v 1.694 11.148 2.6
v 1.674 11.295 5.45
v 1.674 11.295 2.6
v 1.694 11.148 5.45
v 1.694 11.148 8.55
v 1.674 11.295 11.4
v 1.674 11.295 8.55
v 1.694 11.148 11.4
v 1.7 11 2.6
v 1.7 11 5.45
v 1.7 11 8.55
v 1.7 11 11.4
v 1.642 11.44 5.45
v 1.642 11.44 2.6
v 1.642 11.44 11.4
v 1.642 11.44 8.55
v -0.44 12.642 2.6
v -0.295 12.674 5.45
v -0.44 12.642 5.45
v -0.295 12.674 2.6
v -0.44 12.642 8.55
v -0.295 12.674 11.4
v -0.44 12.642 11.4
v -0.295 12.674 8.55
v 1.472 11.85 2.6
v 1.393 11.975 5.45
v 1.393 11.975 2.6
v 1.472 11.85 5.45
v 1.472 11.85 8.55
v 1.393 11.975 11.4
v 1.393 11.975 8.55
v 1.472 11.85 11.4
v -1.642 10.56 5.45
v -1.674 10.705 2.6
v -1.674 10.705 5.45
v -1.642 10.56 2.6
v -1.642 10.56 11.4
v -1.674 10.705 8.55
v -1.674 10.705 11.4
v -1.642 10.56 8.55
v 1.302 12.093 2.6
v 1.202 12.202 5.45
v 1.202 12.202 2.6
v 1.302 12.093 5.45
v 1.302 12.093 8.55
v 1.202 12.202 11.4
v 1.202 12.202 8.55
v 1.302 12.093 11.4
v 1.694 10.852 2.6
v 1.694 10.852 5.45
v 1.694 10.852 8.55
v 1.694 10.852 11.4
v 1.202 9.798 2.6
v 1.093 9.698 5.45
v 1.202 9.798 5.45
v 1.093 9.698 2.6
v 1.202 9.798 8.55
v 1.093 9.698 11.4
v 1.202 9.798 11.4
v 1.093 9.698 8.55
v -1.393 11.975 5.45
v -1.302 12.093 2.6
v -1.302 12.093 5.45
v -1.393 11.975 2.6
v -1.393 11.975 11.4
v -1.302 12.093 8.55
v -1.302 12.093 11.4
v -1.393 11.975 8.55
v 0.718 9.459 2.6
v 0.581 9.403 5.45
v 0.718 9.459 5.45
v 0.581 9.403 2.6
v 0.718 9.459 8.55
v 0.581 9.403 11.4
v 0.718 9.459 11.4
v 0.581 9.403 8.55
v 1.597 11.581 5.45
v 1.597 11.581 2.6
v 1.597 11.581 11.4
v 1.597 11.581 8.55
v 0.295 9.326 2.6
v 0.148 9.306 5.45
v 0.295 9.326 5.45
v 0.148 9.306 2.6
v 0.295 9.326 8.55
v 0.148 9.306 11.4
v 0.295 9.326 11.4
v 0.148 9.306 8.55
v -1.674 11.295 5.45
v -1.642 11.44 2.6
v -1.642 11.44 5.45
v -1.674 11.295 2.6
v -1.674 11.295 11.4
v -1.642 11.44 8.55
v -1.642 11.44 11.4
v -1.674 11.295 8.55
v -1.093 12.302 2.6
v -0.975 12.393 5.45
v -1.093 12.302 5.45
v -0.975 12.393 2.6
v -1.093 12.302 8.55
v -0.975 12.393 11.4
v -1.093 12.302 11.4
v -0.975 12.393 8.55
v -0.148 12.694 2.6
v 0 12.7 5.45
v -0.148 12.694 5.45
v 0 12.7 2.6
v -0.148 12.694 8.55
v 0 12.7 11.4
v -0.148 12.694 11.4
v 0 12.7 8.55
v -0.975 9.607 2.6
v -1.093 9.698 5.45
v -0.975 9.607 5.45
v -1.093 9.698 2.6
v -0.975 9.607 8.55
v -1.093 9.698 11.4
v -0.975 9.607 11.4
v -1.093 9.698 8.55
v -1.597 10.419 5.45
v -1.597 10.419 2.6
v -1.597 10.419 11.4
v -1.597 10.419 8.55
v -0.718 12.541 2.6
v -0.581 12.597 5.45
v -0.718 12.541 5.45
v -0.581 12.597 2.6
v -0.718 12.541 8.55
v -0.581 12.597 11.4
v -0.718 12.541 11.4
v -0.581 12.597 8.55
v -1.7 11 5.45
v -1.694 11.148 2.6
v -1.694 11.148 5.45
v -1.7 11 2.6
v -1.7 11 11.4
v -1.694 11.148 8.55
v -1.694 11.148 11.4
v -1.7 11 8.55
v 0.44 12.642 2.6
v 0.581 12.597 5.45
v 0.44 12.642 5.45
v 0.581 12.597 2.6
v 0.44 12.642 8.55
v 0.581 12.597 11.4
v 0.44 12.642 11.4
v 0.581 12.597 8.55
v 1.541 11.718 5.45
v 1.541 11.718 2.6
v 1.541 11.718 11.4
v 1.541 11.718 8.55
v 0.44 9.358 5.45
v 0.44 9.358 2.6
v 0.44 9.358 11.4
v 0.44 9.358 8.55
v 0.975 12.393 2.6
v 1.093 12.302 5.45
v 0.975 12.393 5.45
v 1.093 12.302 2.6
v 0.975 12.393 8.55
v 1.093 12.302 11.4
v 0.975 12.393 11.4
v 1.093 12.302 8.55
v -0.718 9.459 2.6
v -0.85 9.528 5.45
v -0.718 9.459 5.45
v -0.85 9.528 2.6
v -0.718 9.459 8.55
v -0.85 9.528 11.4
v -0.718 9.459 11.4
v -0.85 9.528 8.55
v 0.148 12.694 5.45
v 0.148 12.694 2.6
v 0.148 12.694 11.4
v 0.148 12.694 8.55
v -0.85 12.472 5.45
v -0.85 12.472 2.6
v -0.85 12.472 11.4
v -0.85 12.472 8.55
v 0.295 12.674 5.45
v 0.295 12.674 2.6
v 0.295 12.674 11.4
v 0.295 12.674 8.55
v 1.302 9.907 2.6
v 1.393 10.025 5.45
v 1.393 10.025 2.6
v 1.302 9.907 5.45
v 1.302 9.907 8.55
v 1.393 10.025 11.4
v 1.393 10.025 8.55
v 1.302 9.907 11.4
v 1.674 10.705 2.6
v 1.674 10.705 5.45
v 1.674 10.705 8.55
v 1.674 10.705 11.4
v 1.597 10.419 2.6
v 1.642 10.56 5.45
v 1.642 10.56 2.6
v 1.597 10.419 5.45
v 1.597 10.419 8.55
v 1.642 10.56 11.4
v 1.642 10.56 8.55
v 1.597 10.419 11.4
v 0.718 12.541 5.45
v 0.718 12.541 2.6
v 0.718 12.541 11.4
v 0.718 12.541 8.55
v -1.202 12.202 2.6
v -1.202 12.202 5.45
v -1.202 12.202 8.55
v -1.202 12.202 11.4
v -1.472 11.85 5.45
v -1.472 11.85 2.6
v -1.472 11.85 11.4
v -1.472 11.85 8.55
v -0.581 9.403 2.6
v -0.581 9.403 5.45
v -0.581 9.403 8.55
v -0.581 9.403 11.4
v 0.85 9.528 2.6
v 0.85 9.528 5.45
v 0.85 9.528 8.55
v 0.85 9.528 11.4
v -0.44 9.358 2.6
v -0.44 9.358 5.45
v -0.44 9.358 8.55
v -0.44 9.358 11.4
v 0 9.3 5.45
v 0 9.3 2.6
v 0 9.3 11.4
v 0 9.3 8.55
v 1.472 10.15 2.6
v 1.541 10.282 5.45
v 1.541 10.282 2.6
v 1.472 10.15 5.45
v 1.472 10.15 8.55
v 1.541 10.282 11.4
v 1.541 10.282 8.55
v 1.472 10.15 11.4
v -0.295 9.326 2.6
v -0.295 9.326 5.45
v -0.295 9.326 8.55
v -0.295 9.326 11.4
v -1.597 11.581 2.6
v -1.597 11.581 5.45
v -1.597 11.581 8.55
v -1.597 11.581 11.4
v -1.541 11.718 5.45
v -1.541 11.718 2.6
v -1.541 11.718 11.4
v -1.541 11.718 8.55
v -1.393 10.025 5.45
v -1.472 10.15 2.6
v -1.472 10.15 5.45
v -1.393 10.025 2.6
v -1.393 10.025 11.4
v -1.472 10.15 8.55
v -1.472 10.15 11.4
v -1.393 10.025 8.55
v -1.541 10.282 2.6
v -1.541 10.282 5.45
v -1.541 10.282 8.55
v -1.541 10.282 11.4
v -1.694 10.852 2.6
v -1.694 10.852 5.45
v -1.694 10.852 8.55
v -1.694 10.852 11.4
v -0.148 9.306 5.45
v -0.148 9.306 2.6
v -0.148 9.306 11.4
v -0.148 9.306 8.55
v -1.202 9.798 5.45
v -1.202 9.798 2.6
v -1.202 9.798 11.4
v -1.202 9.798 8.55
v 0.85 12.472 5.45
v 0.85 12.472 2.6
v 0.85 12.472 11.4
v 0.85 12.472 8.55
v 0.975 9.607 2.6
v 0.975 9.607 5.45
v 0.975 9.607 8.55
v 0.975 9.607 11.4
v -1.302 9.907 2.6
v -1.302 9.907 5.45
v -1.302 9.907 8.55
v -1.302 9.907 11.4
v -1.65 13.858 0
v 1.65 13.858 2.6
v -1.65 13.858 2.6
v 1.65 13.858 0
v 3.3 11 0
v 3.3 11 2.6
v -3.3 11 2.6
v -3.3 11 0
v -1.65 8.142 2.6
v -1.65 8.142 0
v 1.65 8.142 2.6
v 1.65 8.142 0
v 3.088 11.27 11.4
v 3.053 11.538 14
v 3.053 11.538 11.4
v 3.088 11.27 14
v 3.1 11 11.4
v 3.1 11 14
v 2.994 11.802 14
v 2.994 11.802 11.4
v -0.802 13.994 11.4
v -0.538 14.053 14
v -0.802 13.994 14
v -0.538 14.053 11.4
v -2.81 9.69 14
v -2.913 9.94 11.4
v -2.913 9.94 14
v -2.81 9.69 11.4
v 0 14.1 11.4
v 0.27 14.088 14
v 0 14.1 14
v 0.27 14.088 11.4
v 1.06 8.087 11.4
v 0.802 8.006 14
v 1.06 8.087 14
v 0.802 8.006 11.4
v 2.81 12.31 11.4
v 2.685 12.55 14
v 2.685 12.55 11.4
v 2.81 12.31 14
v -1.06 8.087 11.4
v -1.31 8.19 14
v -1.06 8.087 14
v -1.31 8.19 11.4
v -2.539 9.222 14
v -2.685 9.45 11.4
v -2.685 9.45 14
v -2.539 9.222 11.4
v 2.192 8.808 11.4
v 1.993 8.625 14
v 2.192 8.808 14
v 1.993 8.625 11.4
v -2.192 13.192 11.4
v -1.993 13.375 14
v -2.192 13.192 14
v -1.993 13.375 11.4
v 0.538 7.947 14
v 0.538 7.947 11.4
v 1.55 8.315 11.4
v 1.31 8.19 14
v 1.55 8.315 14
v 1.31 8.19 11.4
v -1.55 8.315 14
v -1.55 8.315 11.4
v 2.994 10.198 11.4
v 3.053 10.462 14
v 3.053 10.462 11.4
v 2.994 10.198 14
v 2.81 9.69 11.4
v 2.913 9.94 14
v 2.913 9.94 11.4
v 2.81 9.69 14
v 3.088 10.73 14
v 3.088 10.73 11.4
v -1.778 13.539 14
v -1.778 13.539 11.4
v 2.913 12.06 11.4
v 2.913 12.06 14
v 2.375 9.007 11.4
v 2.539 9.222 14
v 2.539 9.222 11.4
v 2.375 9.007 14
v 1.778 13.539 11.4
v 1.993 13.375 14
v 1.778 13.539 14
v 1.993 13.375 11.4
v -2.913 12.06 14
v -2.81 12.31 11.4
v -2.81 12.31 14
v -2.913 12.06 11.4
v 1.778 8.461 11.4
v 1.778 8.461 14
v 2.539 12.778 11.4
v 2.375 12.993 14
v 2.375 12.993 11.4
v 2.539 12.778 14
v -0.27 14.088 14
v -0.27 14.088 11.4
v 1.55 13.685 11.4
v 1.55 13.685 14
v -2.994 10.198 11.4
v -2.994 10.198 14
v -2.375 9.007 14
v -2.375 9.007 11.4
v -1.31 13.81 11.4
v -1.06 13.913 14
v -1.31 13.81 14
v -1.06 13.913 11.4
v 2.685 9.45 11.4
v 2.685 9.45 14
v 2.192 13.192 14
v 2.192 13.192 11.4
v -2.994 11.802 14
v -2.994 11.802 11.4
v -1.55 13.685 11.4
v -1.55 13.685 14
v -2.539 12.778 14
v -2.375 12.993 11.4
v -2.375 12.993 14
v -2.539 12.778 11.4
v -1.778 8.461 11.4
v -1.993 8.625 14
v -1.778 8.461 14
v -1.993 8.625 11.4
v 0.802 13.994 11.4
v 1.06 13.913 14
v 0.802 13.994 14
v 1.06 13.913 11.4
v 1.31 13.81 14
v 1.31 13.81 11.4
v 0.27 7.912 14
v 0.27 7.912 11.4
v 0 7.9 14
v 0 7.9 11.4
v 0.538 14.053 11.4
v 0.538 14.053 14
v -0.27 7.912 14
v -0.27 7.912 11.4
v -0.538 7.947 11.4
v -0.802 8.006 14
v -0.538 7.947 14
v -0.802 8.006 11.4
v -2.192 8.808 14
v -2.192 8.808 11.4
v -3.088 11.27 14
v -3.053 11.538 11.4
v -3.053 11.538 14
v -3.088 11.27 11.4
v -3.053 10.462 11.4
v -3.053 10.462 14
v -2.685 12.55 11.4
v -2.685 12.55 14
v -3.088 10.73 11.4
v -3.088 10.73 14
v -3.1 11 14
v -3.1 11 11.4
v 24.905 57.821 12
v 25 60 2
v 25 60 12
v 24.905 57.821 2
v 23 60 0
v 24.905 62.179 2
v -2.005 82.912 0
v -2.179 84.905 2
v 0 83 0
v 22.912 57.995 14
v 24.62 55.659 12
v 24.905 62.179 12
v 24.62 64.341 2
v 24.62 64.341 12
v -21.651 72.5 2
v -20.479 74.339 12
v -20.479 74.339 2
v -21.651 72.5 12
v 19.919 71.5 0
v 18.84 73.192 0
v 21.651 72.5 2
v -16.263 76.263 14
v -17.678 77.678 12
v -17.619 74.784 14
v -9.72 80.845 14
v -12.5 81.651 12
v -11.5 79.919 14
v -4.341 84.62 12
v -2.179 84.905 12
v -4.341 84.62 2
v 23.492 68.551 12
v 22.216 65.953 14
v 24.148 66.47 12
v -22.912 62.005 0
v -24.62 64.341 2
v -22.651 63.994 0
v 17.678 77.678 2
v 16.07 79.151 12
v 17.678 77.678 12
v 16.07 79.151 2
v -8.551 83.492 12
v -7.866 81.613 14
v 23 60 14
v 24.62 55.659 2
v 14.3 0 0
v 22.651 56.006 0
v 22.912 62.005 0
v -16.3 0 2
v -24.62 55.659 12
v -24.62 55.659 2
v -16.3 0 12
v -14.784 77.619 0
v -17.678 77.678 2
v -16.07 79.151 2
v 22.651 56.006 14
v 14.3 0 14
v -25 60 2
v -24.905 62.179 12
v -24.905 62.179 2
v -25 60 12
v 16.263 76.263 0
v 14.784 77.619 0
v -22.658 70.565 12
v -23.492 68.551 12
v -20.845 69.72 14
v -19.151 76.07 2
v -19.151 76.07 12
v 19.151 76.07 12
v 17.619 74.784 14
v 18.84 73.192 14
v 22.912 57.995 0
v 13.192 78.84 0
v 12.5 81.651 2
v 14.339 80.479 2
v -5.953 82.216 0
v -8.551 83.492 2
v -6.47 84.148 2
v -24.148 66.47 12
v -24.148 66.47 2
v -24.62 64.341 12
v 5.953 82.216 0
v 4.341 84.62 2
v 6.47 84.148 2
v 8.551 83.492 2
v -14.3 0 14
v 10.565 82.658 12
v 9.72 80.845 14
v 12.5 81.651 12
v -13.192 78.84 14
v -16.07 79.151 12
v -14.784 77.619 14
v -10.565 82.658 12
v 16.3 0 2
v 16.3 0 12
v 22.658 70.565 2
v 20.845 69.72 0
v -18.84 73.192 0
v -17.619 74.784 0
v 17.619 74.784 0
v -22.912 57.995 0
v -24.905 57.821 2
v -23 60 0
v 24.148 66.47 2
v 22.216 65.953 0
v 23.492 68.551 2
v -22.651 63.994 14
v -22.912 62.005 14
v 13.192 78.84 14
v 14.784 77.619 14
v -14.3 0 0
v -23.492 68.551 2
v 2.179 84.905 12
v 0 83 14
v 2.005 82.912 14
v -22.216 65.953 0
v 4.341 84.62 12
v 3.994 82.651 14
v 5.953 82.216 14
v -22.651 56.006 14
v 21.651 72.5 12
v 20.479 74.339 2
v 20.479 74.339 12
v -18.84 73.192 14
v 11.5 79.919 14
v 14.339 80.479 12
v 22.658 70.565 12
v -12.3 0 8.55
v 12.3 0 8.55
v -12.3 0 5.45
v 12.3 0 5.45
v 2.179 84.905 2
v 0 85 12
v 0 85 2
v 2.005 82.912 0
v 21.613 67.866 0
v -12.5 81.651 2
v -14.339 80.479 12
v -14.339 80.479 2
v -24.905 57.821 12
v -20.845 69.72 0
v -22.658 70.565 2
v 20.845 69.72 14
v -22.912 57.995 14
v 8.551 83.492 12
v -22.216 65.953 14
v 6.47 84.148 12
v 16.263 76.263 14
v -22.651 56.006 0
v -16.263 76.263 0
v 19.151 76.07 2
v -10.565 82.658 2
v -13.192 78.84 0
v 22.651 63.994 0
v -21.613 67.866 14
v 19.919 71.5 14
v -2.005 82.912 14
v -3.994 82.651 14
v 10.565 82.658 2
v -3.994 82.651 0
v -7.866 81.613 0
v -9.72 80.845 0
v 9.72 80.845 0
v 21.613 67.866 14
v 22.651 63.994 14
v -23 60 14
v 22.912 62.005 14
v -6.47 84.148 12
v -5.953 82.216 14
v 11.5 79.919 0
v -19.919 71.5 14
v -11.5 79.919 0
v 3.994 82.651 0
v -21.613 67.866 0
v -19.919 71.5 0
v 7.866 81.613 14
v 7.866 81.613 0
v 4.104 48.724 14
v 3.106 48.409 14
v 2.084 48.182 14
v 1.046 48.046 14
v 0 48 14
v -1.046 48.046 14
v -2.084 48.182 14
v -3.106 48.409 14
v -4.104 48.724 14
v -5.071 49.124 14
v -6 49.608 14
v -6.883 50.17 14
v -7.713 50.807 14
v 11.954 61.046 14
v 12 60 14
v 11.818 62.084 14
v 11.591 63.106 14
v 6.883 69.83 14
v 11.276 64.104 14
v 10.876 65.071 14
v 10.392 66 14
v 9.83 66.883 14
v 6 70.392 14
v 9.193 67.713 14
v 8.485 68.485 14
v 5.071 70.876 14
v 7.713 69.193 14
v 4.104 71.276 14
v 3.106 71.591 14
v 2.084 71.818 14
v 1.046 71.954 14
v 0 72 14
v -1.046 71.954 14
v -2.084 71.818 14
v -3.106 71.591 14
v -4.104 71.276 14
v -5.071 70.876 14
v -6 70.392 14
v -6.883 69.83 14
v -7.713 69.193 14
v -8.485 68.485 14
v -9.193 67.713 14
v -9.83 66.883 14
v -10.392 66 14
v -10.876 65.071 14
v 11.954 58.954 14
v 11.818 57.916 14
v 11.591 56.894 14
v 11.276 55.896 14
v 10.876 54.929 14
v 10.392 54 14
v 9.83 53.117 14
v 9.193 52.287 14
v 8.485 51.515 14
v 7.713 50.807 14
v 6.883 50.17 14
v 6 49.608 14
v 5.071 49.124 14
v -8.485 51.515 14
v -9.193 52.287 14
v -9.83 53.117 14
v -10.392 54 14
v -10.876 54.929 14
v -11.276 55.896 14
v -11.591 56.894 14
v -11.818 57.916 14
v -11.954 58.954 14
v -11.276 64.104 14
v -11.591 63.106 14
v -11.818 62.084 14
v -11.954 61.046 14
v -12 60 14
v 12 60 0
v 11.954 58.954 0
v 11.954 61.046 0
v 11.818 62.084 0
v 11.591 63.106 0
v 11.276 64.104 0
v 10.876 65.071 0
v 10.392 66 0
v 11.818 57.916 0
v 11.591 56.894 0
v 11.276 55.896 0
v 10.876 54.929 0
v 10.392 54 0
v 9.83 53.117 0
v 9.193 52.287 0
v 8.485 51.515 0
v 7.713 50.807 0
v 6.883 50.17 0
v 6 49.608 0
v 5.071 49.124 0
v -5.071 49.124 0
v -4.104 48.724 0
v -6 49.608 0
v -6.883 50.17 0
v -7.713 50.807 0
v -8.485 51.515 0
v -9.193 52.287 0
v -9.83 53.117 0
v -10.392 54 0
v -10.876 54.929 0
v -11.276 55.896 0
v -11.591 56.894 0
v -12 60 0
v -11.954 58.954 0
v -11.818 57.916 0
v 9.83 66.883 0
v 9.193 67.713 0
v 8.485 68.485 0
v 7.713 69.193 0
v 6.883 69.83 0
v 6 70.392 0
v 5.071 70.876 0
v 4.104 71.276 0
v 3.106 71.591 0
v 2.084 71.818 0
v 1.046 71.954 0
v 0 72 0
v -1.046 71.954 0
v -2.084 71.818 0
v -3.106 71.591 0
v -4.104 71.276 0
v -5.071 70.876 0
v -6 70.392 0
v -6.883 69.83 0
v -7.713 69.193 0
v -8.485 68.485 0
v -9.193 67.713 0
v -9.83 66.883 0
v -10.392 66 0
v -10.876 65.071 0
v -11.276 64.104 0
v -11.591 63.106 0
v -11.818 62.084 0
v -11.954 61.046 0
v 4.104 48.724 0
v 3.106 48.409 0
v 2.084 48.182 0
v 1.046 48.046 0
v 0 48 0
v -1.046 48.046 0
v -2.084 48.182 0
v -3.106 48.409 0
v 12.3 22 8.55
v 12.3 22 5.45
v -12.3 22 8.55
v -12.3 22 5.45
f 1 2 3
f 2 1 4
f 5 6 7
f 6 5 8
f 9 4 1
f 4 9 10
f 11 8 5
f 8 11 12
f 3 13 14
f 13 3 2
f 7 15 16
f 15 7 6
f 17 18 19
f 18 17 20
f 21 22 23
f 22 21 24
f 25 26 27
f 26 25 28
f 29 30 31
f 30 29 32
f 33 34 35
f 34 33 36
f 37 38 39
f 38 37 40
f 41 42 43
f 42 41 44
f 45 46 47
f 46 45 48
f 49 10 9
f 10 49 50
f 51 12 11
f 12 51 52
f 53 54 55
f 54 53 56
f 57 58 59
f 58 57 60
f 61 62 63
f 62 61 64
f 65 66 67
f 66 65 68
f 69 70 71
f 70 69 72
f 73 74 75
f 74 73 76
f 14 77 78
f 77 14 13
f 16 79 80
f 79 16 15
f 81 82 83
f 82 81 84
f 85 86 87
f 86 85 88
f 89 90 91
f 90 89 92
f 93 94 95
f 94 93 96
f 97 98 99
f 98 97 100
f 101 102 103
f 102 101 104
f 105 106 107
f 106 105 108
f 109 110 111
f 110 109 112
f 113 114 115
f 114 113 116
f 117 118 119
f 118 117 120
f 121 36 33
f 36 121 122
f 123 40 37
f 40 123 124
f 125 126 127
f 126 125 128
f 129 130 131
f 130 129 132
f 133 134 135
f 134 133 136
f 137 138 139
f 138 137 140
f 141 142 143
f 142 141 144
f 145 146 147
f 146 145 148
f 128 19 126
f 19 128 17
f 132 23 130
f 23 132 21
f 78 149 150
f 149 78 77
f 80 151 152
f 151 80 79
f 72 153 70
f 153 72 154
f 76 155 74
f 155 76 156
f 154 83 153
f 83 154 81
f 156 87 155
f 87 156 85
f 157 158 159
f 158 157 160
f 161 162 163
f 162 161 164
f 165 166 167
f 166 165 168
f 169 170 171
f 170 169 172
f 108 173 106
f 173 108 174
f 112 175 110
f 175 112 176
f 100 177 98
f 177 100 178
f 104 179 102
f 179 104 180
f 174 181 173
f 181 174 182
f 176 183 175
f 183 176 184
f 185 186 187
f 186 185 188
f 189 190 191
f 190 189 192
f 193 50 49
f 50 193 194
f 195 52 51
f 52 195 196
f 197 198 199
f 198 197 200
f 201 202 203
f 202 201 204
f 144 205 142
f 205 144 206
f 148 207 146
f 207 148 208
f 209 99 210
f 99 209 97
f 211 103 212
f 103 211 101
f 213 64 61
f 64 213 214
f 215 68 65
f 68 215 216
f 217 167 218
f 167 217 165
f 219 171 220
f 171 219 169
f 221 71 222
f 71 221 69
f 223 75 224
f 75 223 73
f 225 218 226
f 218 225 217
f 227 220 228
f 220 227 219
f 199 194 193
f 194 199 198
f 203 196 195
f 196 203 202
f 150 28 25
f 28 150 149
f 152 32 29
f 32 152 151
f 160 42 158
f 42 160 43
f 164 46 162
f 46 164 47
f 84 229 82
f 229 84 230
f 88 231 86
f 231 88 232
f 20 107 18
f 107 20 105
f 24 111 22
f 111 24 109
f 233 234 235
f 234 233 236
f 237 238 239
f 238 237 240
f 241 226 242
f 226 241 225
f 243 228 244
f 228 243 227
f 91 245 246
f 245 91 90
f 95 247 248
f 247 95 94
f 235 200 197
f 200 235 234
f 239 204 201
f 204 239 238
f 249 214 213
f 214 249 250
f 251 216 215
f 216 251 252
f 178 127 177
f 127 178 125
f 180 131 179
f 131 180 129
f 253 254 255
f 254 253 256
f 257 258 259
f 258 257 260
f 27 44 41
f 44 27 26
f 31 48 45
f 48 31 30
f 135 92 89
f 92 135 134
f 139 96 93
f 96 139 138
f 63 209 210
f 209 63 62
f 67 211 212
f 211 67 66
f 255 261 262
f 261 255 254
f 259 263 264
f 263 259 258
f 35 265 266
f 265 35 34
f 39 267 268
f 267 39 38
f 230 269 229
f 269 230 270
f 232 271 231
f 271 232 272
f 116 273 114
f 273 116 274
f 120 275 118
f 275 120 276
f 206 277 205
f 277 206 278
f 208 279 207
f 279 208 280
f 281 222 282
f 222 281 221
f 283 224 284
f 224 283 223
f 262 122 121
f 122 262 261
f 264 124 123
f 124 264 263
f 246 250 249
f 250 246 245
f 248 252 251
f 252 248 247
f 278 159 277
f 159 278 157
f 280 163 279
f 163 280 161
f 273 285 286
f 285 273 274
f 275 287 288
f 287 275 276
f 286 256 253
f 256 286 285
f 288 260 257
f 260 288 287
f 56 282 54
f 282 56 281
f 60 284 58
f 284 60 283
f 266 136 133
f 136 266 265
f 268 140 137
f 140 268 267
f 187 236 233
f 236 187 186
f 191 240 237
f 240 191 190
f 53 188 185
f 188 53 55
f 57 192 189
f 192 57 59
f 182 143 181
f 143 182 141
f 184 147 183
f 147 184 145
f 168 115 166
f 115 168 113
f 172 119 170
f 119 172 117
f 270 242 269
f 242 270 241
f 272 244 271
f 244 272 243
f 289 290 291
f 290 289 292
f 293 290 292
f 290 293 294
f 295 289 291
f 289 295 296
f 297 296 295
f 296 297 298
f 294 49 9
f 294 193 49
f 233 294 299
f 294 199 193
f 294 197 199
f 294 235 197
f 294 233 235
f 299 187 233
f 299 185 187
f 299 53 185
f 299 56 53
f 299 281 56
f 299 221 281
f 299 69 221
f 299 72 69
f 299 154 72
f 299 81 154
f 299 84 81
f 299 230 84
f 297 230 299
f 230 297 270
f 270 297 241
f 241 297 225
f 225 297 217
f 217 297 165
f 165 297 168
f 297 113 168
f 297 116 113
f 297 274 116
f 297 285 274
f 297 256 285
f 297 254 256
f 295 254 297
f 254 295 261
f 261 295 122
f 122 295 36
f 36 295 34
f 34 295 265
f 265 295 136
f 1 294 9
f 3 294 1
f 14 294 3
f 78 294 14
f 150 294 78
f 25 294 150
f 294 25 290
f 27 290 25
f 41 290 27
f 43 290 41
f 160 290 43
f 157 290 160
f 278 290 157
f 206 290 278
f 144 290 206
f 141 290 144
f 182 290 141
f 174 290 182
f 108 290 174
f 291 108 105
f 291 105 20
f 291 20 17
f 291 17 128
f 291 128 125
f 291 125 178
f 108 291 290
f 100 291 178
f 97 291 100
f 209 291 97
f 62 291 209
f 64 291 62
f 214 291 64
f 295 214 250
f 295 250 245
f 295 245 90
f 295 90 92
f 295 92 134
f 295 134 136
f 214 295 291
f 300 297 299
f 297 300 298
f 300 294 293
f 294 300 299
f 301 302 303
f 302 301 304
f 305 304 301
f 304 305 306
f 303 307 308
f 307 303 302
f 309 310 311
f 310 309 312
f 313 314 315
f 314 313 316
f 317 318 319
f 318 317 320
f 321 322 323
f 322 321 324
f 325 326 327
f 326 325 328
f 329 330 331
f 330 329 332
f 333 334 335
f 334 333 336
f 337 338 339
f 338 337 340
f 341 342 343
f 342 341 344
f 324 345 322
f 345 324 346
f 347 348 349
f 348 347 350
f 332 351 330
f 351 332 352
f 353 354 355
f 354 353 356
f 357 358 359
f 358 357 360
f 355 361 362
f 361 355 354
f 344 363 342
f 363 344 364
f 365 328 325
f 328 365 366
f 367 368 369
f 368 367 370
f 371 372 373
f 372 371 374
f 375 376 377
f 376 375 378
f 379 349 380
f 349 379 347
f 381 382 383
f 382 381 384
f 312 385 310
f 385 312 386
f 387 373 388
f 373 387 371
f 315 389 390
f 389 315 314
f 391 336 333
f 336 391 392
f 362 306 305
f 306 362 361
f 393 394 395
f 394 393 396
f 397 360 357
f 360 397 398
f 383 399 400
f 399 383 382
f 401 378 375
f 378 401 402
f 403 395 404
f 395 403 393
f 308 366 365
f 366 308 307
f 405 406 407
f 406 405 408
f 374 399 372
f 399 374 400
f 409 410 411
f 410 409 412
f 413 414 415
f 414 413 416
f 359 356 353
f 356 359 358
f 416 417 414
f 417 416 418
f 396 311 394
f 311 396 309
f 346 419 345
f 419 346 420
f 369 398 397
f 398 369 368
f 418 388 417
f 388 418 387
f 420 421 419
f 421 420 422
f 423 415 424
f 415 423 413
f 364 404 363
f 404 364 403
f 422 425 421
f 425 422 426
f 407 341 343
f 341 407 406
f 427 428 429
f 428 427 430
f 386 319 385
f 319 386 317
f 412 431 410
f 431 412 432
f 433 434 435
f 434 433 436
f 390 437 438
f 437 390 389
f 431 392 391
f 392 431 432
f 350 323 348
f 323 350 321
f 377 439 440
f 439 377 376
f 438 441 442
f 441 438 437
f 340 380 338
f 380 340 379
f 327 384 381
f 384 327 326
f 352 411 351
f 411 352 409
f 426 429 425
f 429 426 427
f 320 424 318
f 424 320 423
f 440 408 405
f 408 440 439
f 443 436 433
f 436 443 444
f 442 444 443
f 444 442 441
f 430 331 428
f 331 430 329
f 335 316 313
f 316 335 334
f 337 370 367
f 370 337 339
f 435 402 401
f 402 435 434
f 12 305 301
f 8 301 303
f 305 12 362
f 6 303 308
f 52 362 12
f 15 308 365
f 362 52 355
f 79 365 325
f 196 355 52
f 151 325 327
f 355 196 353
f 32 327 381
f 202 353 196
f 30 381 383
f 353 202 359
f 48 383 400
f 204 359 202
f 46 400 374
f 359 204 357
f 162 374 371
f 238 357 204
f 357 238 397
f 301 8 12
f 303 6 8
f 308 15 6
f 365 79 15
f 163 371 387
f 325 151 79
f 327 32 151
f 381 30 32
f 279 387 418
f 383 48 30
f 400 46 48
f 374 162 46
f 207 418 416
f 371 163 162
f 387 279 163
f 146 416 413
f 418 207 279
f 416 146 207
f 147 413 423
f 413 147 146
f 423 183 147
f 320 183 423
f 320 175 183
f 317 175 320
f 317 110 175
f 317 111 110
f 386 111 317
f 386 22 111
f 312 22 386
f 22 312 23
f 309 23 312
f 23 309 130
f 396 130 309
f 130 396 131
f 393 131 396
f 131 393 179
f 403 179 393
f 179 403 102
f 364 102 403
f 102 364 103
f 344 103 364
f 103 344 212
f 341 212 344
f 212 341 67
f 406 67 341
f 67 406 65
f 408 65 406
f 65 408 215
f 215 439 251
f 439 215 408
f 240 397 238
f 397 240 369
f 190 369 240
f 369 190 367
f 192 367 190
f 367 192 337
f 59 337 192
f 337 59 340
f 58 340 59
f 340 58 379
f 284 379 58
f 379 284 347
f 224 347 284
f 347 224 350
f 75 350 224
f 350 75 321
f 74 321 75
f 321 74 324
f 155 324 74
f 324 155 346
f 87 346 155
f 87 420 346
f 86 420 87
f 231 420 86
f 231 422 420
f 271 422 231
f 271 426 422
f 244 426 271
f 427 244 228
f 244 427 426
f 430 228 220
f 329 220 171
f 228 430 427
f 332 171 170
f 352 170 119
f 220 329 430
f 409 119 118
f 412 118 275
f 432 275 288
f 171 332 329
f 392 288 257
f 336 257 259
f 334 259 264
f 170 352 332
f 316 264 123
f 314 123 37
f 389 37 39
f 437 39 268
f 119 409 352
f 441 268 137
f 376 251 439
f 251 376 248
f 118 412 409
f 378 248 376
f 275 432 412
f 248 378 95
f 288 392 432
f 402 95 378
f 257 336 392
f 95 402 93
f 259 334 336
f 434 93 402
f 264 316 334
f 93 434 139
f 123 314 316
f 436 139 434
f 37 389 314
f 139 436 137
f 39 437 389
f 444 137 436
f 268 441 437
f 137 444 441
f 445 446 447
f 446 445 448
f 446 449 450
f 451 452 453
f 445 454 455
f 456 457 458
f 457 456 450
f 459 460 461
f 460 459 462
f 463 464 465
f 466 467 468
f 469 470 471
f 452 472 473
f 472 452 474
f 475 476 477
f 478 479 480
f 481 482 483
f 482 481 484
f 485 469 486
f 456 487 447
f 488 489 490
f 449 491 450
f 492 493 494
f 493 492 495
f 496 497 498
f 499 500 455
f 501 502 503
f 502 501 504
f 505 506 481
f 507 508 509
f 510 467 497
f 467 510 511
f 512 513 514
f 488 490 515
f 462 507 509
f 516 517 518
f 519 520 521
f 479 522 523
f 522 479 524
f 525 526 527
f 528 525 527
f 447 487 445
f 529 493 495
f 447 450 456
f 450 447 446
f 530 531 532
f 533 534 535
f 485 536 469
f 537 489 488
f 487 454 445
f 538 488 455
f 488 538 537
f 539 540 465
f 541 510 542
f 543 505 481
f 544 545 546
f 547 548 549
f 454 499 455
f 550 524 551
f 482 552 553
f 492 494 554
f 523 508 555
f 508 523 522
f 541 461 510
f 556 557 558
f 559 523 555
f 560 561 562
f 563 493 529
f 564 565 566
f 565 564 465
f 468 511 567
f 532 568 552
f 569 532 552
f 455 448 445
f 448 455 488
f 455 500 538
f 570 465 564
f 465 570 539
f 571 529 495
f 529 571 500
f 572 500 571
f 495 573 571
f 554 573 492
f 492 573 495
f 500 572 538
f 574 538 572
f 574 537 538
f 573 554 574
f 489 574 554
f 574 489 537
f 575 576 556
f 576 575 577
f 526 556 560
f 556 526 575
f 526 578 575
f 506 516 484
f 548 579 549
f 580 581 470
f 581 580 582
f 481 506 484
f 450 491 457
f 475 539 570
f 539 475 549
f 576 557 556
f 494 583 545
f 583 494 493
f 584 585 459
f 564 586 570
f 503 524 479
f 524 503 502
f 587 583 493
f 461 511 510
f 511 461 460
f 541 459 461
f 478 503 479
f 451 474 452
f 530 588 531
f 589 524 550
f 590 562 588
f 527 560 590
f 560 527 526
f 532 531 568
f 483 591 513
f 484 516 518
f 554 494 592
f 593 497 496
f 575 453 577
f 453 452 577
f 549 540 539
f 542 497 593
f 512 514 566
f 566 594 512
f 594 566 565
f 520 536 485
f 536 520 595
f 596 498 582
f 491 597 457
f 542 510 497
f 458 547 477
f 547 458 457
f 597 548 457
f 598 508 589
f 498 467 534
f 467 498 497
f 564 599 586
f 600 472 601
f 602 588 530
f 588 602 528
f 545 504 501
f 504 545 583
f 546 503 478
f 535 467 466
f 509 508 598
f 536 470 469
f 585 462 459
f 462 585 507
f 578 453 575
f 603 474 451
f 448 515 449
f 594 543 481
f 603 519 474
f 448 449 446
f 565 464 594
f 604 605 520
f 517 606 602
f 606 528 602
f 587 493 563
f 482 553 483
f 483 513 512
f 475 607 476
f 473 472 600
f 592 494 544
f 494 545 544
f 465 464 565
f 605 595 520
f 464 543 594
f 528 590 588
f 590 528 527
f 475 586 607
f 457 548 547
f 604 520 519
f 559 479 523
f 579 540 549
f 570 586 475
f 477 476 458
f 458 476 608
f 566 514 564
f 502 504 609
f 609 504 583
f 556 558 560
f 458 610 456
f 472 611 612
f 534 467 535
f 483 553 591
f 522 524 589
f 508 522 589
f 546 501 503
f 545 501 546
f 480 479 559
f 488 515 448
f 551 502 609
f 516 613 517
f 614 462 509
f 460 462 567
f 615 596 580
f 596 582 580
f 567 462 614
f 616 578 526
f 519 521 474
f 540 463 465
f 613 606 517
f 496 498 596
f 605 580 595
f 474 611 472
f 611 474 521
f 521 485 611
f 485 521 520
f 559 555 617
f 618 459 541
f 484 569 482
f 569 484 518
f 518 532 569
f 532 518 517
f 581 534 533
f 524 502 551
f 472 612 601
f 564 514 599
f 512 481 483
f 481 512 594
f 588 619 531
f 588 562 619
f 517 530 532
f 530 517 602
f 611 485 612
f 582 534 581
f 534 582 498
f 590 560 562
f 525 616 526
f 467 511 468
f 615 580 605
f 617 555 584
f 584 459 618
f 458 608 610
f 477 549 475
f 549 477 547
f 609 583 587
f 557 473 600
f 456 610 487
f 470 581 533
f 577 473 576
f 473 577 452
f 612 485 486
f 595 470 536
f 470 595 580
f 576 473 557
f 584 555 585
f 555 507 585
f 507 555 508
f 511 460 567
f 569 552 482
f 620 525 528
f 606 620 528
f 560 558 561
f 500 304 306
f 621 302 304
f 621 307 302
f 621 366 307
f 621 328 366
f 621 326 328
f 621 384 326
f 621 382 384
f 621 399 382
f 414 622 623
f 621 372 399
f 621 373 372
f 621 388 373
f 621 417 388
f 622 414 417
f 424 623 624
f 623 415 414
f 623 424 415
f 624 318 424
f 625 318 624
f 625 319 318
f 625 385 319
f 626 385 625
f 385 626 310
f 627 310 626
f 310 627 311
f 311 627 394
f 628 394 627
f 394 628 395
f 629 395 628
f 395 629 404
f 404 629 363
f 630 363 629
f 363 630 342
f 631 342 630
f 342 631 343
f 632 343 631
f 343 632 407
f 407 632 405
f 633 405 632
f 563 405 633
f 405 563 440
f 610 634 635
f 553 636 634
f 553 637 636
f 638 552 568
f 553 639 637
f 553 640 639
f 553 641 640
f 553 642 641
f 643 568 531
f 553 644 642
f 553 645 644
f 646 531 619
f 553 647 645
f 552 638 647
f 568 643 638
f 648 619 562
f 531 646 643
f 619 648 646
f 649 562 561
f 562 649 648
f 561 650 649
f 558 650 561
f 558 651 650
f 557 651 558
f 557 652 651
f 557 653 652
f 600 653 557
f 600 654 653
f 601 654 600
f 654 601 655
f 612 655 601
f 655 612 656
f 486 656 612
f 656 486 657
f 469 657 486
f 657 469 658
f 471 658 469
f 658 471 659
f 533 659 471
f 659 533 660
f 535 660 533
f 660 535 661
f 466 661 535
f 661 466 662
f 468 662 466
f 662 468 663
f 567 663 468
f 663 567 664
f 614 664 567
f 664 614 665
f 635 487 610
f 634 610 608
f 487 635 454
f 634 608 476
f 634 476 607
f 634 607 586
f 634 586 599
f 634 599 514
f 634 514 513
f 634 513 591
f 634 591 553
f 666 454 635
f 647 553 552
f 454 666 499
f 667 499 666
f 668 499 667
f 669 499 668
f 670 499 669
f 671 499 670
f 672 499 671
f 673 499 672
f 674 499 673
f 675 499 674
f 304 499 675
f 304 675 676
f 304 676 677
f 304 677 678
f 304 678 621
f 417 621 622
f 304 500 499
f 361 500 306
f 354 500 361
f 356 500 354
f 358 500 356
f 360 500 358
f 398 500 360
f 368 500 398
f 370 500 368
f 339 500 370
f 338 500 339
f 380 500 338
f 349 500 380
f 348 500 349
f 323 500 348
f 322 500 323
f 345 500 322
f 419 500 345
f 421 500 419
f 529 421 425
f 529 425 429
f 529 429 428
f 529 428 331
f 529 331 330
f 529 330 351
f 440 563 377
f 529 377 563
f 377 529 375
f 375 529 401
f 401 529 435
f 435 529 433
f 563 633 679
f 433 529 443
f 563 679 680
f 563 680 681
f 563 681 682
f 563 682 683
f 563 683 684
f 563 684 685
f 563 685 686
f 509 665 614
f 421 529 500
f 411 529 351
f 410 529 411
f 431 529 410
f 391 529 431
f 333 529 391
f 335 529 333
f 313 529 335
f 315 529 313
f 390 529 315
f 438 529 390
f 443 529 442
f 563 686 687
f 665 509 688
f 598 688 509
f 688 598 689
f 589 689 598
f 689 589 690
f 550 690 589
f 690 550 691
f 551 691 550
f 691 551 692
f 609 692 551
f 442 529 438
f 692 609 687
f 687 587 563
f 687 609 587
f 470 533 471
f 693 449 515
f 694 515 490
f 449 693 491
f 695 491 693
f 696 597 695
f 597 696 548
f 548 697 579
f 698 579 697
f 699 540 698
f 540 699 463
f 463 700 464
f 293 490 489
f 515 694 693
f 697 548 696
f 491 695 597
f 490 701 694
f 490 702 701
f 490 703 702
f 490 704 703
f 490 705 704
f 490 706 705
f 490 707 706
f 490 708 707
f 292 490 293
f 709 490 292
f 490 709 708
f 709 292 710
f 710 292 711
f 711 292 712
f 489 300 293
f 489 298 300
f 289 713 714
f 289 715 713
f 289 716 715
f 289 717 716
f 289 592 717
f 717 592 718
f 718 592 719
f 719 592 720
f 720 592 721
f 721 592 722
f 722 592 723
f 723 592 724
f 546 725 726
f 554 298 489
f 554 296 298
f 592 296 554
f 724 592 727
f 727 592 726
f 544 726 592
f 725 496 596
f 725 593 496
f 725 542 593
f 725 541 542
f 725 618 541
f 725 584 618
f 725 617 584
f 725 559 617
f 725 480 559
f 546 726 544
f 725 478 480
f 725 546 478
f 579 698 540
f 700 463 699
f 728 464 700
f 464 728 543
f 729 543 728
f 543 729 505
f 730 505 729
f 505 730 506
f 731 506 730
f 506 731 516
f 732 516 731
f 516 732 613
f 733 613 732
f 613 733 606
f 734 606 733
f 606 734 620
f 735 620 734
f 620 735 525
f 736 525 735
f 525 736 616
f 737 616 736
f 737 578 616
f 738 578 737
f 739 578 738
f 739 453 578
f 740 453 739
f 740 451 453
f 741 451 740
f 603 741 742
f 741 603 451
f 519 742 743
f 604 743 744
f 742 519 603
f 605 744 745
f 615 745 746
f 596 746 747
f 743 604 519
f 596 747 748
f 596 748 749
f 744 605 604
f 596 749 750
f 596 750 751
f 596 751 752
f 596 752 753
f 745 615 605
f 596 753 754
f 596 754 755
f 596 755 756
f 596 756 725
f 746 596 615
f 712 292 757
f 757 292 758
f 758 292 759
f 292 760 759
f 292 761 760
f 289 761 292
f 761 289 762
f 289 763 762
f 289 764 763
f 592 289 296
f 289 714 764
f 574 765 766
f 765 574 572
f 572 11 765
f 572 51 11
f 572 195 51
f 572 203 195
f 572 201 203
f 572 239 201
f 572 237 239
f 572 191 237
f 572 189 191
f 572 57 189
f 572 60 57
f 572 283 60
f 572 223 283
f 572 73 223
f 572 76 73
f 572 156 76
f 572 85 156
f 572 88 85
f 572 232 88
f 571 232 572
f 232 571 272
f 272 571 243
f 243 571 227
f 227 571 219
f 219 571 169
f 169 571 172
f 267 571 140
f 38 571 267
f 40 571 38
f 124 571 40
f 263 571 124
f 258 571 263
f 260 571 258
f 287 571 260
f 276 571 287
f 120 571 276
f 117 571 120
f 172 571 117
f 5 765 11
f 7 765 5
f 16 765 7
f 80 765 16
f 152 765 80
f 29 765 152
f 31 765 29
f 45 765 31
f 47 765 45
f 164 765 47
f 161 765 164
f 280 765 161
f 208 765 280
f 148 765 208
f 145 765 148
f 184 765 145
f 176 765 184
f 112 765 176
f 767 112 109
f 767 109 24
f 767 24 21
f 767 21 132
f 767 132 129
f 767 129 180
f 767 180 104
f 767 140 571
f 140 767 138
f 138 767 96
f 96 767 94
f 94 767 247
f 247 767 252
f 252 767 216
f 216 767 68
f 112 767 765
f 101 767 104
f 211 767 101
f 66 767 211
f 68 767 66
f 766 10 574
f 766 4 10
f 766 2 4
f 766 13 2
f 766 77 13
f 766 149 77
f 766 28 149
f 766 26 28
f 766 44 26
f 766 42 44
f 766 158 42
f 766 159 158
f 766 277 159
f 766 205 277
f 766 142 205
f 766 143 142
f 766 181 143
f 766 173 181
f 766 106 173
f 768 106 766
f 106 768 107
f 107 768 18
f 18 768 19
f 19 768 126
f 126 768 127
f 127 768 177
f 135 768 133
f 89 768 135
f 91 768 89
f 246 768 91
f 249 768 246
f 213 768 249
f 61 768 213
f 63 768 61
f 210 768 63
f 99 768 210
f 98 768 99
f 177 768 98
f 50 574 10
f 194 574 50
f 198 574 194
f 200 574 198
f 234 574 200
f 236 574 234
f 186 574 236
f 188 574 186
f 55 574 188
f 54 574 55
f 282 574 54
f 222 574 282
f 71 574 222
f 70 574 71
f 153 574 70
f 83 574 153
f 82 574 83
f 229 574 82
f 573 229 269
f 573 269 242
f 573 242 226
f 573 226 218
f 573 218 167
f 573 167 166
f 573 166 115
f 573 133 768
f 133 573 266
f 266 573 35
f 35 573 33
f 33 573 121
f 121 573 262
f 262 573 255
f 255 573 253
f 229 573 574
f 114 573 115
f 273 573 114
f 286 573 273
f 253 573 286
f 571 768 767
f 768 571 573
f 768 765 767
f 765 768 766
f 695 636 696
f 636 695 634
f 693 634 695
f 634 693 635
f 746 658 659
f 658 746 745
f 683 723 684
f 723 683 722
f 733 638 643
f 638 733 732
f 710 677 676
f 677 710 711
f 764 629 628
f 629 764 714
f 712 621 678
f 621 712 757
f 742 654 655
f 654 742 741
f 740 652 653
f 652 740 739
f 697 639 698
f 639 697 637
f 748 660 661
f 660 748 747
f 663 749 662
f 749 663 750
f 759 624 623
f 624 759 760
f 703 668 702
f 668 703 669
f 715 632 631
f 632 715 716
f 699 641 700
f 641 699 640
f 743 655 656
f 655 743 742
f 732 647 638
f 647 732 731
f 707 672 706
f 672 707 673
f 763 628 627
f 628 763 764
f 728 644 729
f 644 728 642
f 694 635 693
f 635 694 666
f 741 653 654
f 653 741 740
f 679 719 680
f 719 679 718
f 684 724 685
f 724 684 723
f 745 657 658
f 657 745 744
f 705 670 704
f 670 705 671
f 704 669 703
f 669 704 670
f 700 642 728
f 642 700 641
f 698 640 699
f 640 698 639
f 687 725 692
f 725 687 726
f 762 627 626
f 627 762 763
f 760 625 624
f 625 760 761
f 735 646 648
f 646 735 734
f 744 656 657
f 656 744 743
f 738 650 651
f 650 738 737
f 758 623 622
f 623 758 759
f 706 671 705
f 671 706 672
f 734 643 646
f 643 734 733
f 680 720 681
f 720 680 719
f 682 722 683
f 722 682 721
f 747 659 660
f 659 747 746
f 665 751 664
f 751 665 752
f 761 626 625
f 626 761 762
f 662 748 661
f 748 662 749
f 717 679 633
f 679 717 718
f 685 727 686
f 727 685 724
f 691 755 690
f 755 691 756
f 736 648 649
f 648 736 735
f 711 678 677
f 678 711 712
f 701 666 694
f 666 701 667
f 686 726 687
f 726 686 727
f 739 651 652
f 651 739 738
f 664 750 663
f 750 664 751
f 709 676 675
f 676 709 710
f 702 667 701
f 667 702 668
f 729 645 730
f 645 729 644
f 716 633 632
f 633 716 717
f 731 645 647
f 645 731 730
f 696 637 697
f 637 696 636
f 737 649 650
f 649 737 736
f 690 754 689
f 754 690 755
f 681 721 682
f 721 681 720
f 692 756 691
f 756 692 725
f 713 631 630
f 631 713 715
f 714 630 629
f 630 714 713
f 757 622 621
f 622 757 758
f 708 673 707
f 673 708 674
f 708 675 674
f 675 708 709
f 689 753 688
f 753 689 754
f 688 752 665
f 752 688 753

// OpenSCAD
// Key turner (Schluesseldreher) - parametric, all dimensions in mm.
// Large lever handle that holds a key, so turning it needs much less pinch force
// and wrist rotation (arthritis, weak pinch grip, tremor). Key is fixed with an
// M3 bolt + nut through the key's hole, or glued. Print flat, no supports.

key_bow_width     = 24;   // width of the key head (bow)
key_bow_length    = 22;   // length of the key head that goes into the handle
key_bow_thickness = 2.5;  // thickness of the key head
lever_length      = 85;   // total length of the turner
lever_width       = 50;   // width of the wide grip end
thickness         = 14;   // thickness of the handle
finger_hole       = 1;    // 1 = finger hole in the grip end
finger_hole_d     = 24;   // finger hole diameter
bolt_hole         = 1;    // 1 = M3 bolt hole + nut trap to fix the key
bolt_offset       = 11;   // distance of the bolt hole from the slot opening
chamfer           = 2;    // edge chamfer
tolerance         = 0.3;

$fn = 72;

kw     = key_bow_width + 2 * tolerance;
kt     = key_bow_thickness + 2 * tolerance;
neck_w = kw + 8;
neck_l = key_bow_length + 6;
L      = max(lever_length, neck_l + lever_width / 2 + 5);
c      = min(chamfer, thickness / 4);

module outline(off = 0) hull() {
    translate([0, L - lever_width / 2]) circle(d = lever_width + 2 * off);
    translate([-(neck_w / 2 + off), 0]) square([neck_w + 2 * off, neck_l]);
}

module body() hull() {
    linear_extrude(height = thickness) outline(-c);
    translate([0, 0, c]) linear_extrude(height = thickness - 2 * c) outline(0);
}

difference() {
    body();
    // key slot
    translate([-kw / 2, -1, (thickness - kt) / 2]) cube([kw, key_bow_length + 1, kt]);
    // finger hole
    if (finger_hole == 1)
        translate([0, L - lever_width / 2, -1])
            cylinder(d = min(finger_hole_d, lever_width - 12), h = thickness + 2);
    // M3 bolt + nut trap
    if (bolt_hole == 1) {
        translate([0, bolt_offset, -1]) cylinder(d = 3.4, h = thickness + 2);
        translate([0, bolt_offset, -1]) cylinder(d = 6.6, h = 3.6, $fn = 6);
        translate([0, bolt_offset, thickness - 2.6]) cylinder(d = 6.2, h = 3);
    }
}
